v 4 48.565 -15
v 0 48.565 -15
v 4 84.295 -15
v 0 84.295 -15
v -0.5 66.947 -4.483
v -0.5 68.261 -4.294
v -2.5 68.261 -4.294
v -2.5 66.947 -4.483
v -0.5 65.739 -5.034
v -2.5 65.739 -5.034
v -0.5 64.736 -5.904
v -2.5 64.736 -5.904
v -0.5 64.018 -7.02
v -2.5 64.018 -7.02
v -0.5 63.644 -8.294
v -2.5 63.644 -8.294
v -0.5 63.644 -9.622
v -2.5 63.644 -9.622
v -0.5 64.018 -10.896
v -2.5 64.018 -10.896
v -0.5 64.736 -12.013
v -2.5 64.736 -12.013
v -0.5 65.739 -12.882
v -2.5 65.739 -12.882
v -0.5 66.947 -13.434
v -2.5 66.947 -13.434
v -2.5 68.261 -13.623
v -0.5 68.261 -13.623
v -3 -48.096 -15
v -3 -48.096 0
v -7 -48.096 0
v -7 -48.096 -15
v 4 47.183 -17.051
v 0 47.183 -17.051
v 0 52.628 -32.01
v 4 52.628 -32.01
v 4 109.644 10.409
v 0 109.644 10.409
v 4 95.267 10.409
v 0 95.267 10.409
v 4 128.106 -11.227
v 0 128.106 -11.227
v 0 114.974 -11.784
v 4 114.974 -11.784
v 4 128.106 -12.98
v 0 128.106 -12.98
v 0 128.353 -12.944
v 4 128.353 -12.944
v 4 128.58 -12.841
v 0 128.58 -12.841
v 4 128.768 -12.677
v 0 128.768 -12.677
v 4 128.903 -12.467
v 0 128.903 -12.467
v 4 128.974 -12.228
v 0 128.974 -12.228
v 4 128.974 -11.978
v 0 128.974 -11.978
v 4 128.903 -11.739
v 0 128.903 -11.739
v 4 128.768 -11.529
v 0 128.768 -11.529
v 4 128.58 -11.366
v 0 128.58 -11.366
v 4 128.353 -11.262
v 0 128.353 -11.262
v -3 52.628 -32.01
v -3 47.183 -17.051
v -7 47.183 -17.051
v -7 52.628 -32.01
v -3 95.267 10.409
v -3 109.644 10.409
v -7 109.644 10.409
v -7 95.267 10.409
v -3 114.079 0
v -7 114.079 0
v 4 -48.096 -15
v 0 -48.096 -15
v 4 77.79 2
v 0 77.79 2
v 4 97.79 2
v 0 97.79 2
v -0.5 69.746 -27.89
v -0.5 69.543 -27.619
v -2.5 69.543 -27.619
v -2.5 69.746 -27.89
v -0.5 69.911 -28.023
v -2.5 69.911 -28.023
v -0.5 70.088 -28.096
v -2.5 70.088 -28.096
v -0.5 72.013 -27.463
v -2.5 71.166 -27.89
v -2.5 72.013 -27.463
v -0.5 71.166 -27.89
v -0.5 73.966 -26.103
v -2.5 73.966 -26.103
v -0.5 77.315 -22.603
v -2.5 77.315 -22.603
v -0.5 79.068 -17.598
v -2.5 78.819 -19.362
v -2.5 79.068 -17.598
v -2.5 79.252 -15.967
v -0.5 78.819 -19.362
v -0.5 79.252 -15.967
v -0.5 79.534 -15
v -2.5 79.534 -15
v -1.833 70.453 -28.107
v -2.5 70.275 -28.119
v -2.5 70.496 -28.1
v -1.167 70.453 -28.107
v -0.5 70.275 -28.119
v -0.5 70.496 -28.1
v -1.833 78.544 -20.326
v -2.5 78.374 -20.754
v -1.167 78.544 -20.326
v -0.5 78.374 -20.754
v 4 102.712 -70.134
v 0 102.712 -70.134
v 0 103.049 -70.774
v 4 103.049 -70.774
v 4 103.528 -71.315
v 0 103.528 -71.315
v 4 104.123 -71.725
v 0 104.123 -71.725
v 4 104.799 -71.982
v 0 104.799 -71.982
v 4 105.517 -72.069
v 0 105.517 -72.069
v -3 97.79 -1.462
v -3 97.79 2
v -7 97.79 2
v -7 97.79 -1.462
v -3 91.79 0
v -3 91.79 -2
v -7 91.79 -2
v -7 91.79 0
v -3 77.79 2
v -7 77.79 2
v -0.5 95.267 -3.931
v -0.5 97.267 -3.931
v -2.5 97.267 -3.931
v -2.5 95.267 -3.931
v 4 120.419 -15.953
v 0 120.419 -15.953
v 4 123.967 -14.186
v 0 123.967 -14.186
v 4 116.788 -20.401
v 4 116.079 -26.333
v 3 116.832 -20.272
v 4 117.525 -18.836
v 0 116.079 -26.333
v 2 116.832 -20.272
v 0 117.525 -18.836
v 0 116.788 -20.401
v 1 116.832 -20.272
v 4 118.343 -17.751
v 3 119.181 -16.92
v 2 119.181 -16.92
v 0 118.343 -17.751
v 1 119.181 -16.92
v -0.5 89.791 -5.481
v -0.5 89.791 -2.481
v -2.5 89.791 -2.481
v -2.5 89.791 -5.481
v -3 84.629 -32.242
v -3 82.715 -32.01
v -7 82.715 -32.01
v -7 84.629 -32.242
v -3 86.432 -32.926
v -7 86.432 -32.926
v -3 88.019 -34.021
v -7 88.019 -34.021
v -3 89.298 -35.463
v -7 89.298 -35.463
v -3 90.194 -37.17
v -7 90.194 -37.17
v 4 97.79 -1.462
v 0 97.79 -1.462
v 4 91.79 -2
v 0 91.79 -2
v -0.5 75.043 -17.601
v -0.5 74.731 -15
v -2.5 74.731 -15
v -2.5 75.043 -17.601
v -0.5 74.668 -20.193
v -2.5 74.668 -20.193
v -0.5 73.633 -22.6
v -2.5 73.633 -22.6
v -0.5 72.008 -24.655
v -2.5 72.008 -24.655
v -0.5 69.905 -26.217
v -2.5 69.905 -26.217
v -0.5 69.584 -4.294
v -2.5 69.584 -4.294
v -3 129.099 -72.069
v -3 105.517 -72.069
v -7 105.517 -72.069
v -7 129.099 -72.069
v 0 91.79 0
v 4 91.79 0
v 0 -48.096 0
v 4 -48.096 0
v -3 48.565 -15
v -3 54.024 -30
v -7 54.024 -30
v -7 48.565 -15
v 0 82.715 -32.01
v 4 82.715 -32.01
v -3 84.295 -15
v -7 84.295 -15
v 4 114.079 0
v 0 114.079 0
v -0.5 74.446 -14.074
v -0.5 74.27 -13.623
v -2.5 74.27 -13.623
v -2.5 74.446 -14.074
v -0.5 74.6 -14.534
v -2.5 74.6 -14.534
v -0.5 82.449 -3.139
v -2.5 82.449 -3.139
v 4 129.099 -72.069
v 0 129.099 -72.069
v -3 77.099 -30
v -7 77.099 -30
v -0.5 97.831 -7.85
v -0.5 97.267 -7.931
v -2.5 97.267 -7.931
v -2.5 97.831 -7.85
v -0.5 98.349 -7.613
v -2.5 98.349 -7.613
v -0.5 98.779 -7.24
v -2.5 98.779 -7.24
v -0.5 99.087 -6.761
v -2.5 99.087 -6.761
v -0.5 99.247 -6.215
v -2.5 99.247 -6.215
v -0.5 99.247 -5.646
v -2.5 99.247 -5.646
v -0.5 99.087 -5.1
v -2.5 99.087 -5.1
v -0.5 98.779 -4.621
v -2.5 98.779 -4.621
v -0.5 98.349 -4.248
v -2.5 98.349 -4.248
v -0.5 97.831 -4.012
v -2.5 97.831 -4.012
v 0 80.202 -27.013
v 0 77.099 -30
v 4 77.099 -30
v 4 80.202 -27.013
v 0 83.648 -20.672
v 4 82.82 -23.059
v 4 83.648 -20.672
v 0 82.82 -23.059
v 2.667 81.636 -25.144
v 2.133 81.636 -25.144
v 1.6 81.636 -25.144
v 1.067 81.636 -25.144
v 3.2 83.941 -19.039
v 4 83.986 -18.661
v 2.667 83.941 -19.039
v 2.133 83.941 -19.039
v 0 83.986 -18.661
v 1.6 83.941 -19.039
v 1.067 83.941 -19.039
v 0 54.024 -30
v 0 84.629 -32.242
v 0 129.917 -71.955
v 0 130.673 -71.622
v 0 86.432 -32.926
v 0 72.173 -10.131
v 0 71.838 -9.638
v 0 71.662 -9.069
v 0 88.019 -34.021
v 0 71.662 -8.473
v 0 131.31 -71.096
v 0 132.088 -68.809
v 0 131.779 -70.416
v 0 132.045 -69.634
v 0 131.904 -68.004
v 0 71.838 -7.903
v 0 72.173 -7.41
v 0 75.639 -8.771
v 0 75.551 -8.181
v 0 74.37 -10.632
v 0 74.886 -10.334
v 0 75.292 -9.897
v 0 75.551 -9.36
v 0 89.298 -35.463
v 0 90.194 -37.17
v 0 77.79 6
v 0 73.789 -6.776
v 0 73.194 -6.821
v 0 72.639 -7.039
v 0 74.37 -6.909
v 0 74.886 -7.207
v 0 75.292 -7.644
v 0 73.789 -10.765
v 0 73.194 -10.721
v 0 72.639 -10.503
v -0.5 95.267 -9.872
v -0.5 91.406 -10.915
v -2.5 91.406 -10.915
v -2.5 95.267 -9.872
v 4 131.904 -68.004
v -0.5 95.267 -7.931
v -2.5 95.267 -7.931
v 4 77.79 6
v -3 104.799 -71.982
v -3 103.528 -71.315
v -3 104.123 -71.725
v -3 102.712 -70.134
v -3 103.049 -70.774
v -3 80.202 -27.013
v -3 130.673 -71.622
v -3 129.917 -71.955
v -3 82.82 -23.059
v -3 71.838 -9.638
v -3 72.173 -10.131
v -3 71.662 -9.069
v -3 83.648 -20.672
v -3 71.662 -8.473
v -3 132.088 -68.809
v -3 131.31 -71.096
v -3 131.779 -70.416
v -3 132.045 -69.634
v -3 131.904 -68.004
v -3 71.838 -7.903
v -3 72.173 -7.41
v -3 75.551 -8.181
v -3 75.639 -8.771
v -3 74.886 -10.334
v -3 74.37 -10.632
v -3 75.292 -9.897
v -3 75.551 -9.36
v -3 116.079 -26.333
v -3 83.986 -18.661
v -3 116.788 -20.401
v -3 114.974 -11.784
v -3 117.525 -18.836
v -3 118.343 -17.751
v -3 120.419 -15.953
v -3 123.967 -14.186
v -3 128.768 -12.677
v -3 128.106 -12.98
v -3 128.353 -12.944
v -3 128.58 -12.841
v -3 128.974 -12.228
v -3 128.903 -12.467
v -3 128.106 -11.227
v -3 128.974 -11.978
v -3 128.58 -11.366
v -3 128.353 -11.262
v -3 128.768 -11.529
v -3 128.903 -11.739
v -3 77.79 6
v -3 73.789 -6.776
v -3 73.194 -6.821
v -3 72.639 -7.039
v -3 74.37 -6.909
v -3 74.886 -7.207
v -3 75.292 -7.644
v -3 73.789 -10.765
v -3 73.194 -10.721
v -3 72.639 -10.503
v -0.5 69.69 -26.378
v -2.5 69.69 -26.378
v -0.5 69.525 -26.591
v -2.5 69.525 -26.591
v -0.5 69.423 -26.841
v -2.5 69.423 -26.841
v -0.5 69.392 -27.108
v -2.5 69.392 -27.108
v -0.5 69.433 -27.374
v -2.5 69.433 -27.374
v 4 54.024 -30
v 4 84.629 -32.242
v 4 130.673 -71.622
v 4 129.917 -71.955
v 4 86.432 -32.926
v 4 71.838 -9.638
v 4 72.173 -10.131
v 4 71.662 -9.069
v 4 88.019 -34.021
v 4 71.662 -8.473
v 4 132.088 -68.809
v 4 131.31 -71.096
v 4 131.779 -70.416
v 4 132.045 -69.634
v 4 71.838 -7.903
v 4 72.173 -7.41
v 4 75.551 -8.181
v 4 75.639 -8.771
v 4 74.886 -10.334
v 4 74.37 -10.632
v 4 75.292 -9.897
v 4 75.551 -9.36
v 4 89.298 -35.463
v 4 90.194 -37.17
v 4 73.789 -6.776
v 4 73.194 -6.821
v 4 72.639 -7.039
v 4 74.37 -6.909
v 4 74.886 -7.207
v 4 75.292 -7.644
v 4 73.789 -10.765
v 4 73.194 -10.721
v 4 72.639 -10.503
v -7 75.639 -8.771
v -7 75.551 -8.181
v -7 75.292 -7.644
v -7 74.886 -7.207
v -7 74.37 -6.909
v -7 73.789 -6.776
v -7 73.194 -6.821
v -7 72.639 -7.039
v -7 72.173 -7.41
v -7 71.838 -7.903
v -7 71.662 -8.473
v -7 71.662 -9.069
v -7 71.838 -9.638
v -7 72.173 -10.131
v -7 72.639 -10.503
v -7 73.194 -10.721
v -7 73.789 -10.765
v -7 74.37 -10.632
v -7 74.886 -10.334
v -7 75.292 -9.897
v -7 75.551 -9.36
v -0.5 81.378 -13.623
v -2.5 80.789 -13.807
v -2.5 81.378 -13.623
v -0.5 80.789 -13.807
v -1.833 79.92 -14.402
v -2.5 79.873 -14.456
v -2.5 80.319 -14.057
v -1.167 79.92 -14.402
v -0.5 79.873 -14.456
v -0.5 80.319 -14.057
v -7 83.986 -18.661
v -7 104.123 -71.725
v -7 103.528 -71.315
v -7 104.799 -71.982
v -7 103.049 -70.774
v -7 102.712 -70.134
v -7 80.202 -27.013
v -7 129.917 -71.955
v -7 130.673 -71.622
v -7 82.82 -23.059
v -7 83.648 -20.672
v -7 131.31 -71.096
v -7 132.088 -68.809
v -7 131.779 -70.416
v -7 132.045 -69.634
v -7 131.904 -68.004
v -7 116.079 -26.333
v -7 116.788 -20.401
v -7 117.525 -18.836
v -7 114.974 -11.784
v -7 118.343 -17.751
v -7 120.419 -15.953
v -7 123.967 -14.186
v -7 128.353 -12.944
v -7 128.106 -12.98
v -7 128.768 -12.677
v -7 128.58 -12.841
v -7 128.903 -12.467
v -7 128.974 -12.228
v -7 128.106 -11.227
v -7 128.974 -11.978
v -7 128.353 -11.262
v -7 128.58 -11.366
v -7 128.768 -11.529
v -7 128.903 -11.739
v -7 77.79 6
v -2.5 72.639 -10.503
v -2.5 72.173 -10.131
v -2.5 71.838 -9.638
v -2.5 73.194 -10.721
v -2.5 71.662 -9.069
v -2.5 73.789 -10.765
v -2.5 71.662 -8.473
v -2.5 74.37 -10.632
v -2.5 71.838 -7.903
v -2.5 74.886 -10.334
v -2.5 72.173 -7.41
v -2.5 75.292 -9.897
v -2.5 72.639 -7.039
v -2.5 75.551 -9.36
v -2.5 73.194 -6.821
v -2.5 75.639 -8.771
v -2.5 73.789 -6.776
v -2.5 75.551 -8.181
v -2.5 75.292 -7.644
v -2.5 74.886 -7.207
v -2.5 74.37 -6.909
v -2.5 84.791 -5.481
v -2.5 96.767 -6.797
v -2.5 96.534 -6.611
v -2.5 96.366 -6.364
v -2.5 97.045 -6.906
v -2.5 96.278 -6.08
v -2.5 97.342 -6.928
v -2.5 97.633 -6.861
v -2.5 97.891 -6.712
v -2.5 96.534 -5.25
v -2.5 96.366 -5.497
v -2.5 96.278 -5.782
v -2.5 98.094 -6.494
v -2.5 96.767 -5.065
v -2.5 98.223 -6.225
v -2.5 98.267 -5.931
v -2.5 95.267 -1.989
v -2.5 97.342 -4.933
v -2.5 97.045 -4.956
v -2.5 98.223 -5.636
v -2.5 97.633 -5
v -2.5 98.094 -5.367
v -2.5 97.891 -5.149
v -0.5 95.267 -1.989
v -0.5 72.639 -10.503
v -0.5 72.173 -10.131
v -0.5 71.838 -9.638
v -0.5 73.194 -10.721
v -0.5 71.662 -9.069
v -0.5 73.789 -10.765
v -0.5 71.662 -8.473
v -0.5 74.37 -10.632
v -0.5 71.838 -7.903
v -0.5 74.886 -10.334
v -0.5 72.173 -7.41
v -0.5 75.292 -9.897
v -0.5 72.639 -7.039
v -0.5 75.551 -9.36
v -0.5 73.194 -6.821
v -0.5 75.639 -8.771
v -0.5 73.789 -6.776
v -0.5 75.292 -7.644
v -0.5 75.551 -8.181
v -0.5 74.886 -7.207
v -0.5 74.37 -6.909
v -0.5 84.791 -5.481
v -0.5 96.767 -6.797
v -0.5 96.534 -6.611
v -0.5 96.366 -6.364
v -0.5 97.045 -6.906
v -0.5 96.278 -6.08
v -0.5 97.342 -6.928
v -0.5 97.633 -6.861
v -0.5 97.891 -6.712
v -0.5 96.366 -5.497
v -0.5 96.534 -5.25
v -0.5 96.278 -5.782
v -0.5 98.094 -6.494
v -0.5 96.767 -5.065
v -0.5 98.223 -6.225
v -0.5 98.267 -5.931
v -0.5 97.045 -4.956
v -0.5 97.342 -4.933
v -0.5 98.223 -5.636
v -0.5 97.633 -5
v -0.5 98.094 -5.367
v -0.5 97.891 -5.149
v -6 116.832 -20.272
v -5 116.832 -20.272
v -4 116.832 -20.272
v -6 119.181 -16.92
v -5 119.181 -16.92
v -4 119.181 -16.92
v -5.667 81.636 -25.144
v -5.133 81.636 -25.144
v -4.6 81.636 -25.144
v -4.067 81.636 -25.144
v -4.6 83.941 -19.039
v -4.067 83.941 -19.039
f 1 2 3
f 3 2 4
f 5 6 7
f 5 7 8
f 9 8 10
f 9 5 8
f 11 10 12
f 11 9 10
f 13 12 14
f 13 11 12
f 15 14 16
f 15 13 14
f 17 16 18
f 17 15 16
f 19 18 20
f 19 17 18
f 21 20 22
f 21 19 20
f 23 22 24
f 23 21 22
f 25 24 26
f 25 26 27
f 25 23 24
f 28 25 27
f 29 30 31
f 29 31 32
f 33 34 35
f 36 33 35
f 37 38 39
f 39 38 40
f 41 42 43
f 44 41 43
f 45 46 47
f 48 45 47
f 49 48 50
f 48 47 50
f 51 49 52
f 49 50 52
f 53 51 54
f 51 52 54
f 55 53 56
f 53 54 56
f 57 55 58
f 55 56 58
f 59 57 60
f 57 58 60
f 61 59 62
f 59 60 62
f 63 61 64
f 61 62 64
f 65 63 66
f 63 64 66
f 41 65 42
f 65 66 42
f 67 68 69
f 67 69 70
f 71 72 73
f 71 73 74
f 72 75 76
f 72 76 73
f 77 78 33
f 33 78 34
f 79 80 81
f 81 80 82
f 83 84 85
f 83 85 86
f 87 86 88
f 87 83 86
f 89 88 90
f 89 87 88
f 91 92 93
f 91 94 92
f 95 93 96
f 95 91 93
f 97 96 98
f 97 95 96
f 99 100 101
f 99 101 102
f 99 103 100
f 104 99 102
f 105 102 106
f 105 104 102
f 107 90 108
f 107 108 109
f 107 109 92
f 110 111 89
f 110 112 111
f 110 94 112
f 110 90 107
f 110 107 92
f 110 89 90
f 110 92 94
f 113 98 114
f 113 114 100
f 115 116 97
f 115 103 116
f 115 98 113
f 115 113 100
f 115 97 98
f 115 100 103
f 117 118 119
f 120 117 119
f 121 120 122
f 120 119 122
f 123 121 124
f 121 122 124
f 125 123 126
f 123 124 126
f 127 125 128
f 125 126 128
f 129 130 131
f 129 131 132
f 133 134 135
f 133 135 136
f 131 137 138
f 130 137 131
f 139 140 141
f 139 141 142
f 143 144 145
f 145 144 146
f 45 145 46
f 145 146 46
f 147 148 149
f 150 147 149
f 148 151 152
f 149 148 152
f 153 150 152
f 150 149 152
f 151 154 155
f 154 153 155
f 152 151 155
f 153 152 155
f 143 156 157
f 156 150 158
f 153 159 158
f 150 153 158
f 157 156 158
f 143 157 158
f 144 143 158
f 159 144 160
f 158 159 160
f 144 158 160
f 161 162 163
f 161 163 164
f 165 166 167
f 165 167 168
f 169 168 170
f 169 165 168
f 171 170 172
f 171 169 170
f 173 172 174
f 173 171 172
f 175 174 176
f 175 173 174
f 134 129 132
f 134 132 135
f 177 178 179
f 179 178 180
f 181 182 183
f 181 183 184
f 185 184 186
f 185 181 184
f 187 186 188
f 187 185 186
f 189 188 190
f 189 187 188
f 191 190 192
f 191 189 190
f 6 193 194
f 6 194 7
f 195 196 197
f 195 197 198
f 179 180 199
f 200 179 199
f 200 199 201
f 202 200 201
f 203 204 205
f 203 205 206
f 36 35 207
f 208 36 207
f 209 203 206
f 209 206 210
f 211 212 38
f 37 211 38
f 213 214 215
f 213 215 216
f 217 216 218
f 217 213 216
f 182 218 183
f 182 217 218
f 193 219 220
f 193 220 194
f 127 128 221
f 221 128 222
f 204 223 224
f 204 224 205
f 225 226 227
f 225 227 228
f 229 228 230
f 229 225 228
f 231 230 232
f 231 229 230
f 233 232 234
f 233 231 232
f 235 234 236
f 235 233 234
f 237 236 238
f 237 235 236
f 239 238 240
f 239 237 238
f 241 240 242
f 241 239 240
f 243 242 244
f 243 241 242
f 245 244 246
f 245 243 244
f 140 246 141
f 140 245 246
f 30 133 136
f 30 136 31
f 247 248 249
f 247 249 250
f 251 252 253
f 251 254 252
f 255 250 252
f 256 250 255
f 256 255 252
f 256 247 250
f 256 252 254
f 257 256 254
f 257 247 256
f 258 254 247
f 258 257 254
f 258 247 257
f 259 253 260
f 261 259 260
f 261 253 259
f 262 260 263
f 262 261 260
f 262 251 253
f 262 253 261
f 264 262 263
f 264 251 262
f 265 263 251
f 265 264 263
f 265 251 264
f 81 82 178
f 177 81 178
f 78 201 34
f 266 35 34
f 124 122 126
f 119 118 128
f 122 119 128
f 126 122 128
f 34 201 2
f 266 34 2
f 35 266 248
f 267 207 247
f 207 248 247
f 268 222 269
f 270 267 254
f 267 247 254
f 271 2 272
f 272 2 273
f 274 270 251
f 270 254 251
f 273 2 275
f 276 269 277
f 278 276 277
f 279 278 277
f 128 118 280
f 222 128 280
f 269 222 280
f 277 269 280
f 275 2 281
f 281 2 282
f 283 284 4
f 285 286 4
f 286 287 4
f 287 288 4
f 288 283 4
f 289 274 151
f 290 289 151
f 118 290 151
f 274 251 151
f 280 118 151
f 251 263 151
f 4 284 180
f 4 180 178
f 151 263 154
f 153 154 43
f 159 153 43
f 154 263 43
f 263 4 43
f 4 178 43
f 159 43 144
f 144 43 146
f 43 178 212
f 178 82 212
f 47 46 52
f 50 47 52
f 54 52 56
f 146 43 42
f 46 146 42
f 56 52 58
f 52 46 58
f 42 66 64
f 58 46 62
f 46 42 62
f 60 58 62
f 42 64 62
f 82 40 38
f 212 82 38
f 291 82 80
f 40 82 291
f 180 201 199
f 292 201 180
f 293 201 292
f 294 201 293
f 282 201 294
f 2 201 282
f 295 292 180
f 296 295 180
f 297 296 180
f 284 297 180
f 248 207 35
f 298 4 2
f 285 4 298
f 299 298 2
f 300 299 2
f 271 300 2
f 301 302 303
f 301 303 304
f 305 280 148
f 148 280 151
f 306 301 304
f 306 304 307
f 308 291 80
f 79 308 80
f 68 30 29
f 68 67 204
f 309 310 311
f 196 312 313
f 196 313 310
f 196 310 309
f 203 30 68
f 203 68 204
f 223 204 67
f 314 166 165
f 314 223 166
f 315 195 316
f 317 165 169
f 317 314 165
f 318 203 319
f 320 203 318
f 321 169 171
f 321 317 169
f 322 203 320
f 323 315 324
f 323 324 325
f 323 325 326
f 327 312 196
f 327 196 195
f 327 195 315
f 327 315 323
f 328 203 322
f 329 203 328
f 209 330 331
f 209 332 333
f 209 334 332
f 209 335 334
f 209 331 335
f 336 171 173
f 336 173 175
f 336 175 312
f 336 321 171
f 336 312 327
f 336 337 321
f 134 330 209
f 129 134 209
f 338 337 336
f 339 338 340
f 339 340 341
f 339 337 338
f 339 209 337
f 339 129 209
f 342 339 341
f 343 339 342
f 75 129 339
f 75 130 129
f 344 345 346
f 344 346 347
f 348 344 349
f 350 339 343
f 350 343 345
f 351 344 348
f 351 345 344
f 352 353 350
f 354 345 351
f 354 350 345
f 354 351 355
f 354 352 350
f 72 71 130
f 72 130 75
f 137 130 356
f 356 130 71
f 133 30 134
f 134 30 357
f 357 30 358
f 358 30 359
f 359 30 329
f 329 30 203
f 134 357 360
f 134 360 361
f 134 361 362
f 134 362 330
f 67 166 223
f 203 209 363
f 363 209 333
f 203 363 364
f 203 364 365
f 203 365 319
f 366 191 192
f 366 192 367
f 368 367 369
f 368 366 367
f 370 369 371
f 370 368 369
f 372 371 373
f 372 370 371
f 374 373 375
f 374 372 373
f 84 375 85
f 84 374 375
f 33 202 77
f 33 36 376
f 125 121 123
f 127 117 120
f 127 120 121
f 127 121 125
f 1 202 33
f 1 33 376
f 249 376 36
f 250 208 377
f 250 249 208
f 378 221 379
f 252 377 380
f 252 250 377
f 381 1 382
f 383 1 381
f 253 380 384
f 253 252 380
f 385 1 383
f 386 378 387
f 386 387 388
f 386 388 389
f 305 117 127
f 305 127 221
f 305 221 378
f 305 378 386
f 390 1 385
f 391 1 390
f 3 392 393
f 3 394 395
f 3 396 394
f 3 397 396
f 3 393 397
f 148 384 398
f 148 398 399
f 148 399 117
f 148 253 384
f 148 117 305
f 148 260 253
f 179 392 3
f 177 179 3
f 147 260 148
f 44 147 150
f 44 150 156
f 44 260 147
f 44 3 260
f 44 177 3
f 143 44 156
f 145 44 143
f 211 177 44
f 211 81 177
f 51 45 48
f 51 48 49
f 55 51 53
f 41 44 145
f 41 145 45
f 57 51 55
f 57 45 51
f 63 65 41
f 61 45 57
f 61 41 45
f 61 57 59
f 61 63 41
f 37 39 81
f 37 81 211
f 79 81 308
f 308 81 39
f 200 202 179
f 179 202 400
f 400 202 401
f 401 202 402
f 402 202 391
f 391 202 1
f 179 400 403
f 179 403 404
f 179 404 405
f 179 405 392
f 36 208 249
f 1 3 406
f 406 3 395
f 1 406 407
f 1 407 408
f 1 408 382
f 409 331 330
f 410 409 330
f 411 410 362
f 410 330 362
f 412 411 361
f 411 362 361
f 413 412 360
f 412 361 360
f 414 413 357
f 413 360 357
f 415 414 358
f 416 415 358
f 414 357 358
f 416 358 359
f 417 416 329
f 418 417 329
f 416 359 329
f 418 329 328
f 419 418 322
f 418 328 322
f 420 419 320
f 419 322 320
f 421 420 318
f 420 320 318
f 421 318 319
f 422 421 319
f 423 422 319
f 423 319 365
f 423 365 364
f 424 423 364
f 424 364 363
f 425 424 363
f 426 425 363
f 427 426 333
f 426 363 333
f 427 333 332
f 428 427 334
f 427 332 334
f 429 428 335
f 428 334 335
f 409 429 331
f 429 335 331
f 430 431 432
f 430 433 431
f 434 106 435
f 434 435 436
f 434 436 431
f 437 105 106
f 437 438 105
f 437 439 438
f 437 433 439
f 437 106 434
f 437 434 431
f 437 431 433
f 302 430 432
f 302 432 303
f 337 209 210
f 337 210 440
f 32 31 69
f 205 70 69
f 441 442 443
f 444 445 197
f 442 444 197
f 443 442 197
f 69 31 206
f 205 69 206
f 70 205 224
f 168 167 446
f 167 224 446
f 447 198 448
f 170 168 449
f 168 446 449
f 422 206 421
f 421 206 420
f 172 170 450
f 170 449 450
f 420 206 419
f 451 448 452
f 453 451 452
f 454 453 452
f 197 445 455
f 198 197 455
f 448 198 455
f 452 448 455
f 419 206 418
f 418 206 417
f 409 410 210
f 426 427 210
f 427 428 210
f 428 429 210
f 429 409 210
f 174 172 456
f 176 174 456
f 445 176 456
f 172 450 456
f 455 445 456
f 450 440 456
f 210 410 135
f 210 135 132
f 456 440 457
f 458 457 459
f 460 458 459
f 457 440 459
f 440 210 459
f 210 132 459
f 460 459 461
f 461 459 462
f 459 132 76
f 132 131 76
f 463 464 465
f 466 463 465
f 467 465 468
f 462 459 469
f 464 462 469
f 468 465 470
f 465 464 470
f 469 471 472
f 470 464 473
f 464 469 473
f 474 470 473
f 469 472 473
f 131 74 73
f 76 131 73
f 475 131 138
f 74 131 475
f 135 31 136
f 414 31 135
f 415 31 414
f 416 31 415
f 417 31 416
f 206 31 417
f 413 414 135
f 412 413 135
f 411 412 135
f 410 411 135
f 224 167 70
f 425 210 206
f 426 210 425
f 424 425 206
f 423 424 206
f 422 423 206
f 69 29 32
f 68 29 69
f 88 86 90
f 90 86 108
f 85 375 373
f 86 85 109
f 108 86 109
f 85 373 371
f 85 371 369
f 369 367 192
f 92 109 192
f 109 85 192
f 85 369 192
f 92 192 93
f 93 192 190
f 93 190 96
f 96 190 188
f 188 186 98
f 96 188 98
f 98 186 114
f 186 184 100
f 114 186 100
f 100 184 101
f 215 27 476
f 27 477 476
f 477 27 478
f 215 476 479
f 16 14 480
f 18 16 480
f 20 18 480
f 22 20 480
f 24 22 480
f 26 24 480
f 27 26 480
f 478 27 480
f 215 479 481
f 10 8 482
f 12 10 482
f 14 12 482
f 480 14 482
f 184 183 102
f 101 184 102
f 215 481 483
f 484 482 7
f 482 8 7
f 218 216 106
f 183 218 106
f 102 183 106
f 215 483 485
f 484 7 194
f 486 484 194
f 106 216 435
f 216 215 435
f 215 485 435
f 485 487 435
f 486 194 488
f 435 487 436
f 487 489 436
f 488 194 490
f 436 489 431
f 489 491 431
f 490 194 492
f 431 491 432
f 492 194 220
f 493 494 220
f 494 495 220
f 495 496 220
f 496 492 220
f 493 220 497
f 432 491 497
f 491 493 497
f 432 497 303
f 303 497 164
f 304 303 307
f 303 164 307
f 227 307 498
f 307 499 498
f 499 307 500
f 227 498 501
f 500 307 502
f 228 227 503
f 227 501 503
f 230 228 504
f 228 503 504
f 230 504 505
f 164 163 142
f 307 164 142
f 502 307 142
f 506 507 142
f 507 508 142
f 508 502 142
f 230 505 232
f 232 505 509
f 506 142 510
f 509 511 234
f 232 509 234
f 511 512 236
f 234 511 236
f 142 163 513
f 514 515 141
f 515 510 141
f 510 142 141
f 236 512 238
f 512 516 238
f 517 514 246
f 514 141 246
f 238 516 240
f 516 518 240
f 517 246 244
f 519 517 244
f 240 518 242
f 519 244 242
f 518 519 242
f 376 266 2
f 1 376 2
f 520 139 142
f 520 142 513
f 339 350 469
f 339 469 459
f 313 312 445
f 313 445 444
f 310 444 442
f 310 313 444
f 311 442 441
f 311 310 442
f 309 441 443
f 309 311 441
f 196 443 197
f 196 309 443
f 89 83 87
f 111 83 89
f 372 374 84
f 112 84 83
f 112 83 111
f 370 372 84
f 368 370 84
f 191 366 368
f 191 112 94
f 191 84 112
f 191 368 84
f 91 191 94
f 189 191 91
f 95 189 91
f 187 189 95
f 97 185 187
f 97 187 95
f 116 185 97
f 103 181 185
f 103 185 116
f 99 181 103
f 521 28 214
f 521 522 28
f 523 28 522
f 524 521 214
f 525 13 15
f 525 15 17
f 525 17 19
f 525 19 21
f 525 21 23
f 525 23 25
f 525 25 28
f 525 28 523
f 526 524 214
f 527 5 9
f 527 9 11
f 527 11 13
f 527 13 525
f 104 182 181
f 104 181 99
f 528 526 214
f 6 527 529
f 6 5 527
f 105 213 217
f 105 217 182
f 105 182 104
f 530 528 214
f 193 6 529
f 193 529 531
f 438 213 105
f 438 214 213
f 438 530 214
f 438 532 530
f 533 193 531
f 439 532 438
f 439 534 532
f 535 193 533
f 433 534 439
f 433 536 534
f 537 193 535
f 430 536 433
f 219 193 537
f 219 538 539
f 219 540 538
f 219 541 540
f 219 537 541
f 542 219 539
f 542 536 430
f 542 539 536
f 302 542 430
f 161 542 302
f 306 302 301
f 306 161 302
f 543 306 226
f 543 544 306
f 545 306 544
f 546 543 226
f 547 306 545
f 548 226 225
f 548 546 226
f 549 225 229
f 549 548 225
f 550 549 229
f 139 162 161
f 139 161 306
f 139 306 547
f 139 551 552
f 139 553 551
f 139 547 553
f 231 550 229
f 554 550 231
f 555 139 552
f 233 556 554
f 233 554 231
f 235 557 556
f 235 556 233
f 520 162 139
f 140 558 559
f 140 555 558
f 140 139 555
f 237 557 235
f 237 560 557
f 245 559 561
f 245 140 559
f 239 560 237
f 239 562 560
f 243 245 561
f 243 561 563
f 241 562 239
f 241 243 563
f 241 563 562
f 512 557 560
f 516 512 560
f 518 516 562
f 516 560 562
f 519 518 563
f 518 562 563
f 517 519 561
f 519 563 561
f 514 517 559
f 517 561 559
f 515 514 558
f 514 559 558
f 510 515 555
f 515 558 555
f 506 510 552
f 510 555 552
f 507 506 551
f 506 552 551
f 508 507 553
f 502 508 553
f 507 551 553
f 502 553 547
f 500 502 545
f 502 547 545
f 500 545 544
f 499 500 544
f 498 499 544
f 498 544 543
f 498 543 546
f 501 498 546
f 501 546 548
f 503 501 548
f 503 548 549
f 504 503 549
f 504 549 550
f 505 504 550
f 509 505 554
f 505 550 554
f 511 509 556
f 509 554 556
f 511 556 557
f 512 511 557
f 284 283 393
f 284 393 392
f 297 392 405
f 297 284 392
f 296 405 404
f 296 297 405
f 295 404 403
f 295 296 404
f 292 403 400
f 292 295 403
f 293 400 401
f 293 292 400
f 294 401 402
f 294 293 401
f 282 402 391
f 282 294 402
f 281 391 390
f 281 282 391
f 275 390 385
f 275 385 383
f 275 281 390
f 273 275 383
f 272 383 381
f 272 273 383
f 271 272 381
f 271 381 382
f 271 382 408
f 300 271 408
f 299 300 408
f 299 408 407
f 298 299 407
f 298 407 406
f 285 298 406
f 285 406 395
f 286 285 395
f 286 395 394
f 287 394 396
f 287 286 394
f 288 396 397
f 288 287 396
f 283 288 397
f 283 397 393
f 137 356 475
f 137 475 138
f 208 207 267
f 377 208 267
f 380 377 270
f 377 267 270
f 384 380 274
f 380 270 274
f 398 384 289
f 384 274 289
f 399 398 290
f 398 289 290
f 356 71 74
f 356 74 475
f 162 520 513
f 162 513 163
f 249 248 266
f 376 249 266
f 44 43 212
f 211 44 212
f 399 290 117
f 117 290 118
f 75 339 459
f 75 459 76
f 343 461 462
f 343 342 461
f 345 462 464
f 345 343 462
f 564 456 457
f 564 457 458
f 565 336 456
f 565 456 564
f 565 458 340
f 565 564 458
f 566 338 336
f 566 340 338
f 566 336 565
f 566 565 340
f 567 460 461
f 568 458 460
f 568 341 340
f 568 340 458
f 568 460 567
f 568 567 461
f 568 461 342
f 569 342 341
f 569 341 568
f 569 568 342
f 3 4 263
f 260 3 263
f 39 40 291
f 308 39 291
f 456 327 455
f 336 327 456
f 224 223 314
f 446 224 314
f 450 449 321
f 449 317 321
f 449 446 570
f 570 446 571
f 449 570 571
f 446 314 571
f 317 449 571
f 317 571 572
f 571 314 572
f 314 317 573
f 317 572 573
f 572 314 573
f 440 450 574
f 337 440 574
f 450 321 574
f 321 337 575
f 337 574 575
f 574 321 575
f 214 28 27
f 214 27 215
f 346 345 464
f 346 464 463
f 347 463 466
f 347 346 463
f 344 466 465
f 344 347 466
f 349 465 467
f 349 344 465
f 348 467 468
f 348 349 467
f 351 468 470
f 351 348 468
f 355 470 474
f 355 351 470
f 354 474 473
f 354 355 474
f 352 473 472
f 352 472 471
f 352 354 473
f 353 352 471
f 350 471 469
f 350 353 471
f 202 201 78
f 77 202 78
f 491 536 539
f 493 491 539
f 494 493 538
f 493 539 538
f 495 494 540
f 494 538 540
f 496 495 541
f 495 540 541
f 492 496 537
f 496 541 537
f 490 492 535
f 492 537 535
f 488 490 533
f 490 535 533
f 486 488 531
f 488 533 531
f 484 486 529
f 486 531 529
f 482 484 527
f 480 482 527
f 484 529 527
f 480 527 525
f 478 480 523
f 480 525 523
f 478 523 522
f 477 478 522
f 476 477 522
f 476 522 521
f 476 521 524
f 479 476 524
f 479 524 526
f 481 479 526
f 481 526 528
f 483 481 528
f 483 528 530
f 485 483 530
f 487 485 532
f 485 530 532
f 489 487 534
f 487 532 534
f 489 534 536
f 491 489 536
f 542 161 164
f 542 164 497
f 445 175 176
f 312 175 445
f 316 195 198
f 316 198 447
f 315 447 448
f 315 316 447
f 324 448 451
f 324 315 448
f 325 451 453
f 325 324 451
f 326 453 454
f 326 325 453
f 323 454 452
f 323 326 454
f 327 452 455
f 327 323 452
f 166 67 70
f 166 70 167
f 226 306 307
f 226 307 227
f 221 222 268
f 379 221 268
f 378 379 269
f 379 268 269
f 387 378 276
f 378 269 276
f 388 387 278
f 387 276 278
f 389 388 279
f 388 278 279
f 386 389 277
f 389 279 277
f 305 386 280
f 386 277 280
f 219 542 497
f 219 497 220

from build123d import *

# Parameters (mm, degrees)
F1_START = -0.5
F0_R     = 2
F0_R_2   = 1
F1_DEPTH = 2
F2_DEPTH = 4


# Not quite as in the source:
# - ends of sketch curves that miss each other by under 0.0002 mm in the source are joined
# - the dataset's text gives a spline's control points without its knots; the knots are read off the source's solid
# - a feature names something its author has since deleted; it is built from what else it names


with BuildPart() as f1:
    # F0 (on Right) → F1 (new body)
    with BuildSketch(Plane.YZ.offset(F1_START)):
        with BuildLine():
            ThreePointArc((74.2699354887, -13.6226043105), (74.5256304067, -14.3029139587), (74.7312395212, -14.9999978852))
            Line((74.7312395212, -14.9999978852), (79.5344771551, -14.9999978852))
            add(Edge.make_bspline(
                [(79.5344771551, -14.9999978852), (79.833759811, -14.3420916762), (80.3656146055, -13.855022927), (81.3782960176, -13.6226043105)],
                knots=[0.8797014903, 0.8797014903, 0.8797014903, 0.8797014903, 1, 1, 1, 1], degree=3))
            Line((81.3782960176, -13.6226043105), (91.4055867413, -10.9148137206))
            Line((91.4055867413, -10.9148137206), (95.2672621608, -9.8719988018))
            Line((95.2672621608, -9.8719988018), (95.2672621608, -7.9305966889))
            Line((95.2672621608, -7.9305966889), (95.2672621608, -3.9305966889))
            Line((95.2672621608, -3.9305966889), (95.2672621608, -1.989194576))
            Line((95.2672621608, -1.989194576), (89.7907053864, -2.4806121155))
            Line((89.7907053864, -2.4806121155), (89.7907053864, -5.4806121155))
            Line((89.7907053864, -5.4806121155), (84.7907053864, -5.4806121155))
            Line((84.7907053864, -5.4806121155), (82.4494448697, -3.1393515989))
            Line((82.4494448697, -3.1393515989), (69.5844688412, -4.2937402278))
            Line((69.5844688412, -4.2937402278), (68.2608369428, -4.2937402278))
            ThreePointArc((68.2608369428, -4.2937402278), (63.5964049015, -8.9581722692), (68.2608369428, -13.6226043105))
            Line((68.2608369428, -13.6226043105), (74.2699354887, -13.6226043105))
        make_face()
        with Locations((73.6394673586, -8.7706744671)):
            Circle(F0_R, mode=Mode.SUBTRACT)
        with BuildLine():
            ThreePointArc((74.7312395212, -14.9999978852), (74.229250114, -21.4306402993), (69.9054296146, -26.2170514299))
            ThreePointArc((69.9054296146, -26.2170514299), (69.4234887038, -26.8405376944), (69.5427737838, -27.6194941971))
            add(Edge.make_bspline(
                [(69.5427737838, -27.6194941971), (69.7756231299, -27.9934208955), (70.8908571939, -28.846881775), (79.88515612, -22.0379378106), (78.9360042075, -16.3156072614), (79.5344771551, -14.9999978852)],
                knots=[0.0751310014, 0.0751310014, 0.0751310014, 0.0751310014, 0.1909888597, 0.6391415971, 0.8797014903, 0.8797014903, 0.8797014903, 0.8797014903], degree=3))
            Line((79.5344771551, -14.9999978852), (74.7312395212, -14.9999978852))
        make_face()
        with BuildLine():
            Line((95.2672621608, -3.9305966889), (95.2672621608, -7.9305966889))
            Line((95.2672621608, -7.9305966889), (97.2672621608, -7.9305966889))
            ThreePointArc((97.2672621608, -7.9305966889), (99.2672621608, -5.9305966889), (97.2672621608, -3.9305966889))
            Line((97.2672621608, -3.9305966889), (95.2672621608, -3.9305966889))
        make_face()
        with Locations((97.2672621608, -5.9305966889)):
            Circle(F0_R_2, mode=Mode.SUBTRACT)
    extrude(amount=-F1_DEPTH)


with BuildPart() as f2:
    # F0 (on Right) → F2 (new body)
    with BuildSketch(Plane.YZ):
        with BuildLine():
            ThreePointArc((82.7154165104, -32.0100596195), (87.2584865329, -33.4251894787), (90.194298045, -37.1699309267))
            Line((90.194298045, -37.1699309267), (102.7124142253, -70.1337568918))
            ThreePointArc((102.7124142253, -70.1337568918), (103.8133435424, -71.5380349348), (105.5169948008, -72.068708632))
            Line((105.5169948008, -72.068708632), (129.0989228233, -72.068708632))
            ThreePointArc((129.0989228233, -72.068708632), (131.5682491261, -70.7723598904), (131.9035033988, -68.0036603722))
            Line((131.9035033988, -68.0036603722), (116.0789003285, -26.3328966518))
            add(Edge.make_bspline(
                [(116.0789003285, -26.3328966518), (116.1564016078, -24.1501429386), (116.2971797879, -20.1785641936), (119.0310238282, -16.7283649073), (122.8788302042, -14.3416877179), (126.3069431811, -13.450153948), (128.1059980392, -12.9797337577)],
                knots=[0, 0, 0, 0, 0.2769497136, 0.5036740855, 0.738714159, 1, 1, 1, 1], degree=3))
            ThreePointArc((128.1059980392, -12.9797337577), (128.982509952, -12.1032218449), (128.1059980392, -11.2267099321))
            Line((128.1059980392, -11.2267099321), (114.9739147732, -11.7841614367))
            Line((114.9739147732, -11.7841614367), (114.0789003285, 0))
            Line((114.0789003285, 0), (109.6443608403, 10.4085551575))
            Line((109.6443608403, 10.4085551575), (95.2672621608, 10.4085551575))
            Line((95.2672621608, 10.4085551575), (77.7900875211, 6))
            Line((77.7900875211, 6), (77.7900875211, 2))
            Line((77.7900875211, 2), (97.7900875211, 2))
            Line((97.7900875211, 2), (97.7900875211, 0))
            Line((97.7900875211, 0), (97.7900875211, -1.4616133168))
            Line((97.7900875211, -1.4616133168), (91.7900875211, -2))
            Line((91.7900875211, -2), (91.7900875211, 0))
            Line((91.7900875211, 0), (-48.0964966012, 0))
            Line((-48.0964966012, 0), (-48.0964966012, -15))
            Line((-48.0964966012, -15), (47.1827716724, -17.0506781676))
            Line((47.1827716724, -17.0506781676), (52.6275412439, -32.0100596195))
            Line((52.6275412439, -32.0100596195), (82.7154165104, -32.0100596195))
        make_face()
        with BuildLine():
            Line((48.5647406346, -14.9999978852), (74.7312395212, -14.9999978852))
            ThreePointArc((74.7312395212, -14.9999978852), (74.5256304067, -14.3029139587), (74.2699354887, -13.6226043105))
            Line((74.2699354887, -13.6226043105), (68.2608369428, -13.6226043105))
            ThreePointArc((68.2608369428, -13.6226043105), (63.5964049015, -8.9581722692), (68.2608369428, -4.2937402278))
            Line((68.2608369428, -4.2937402278), (69.5844688412, -4.2937402278))
            Line((69.5844688412, -4.2937402278), (82.4494448697, -3.1393515989))
            Line((82.4494448697, -3.1393515989), (84.7907053864, -5.4806121155))
            Line((84.7907053864, -5.4806121155), (89.7907053864, -5.4806121155))
            Line((89.7907053864, -5.4806121155), (89.7907053864, -2.4806121155))
            Line((89.7907053864, -2.4806121155), (95.2672621608, -1.989194576))
            Line((95.2672621608, -1.989194576), (95.2672621608, -3.9305966889))
            Line((95.2672621608, -3.9305966889), (97.2672621608, -3.9305966889))
            ThreePointArc((97.2672621608, -3.9305966889), (99.2672621608, -5.9305966889), (97.2672621608, -7.9305966889))
            Line((97.2672621608, -7.9305966889), (95.2672621608, -7.9305966889))
            Line((95.2672621608, -7.9305966889), (95.2672621608, -9.8719988018))
            Line((95.2672621608, -9.8719988018), (95.7886696202, -11.8028365115))
            Line((95.7886696202, -11.8028365115), (91.9269942007, -12.8456514304))
            Line((91.9269942007, -12.8456514304), (91.4055867413, -10.9148137206))
            Line((91.4055867413, -10.9148137206), (81.3782960176, -13.6226043105))
            add(Edge.make_bspline(
                [(79.5344771551, -14.9999978852), (79.833759811, -14.3420916762), (80.3656146055, -13.855022927), (81.3782960176, -13.6226043105)],
                knots=[0.8797014903, 0.8797014903, 0.8797014903, 0.8797014903, 1, 1, 1, 1], degree=3))
            Line((79.5344771551, -14.9999978852), (84.2950418591, -14.9999978852))
            Line((84.2950418591, -14.9999978852), (83.986338858, -18.6614259073))
            add(Edge.make_bspline(
                [(77.0986897784, -30.0000272336), (77.4741298849, -29.6976374668), (78.3368077115, -28.960094006), (79.6638223749, -27.6571775431), (80.7998106474, -26.3257545652), (81.6427583036, -25.1541637131), (82.2327671194, -24.2151704071), (82.6797224931, -23.3743926577), (83.002030475, -22.6607865386), (83.1867359511, -22.1955964224), (83.3220738815, -21.8126055157), (83.4441699526, -21.4374057344), (83.5752904919, -20.9792524975), (83.7019603463, -20.4522364549), (83.8361720396, -19.7834574031), (83.9254022758, -19.1835780723), (83.97287916, -18.7827266699), (83.986338858, -18.6614259073)],
                knots=[0.3840308553, 0.3840308553, 0.3840308553, 0.3840308553, 0.4248462567, 0.4779520388, 0.5310578209, 0.5576107119, 0.584163603, 0.610716494, 0.6239929395, 0.6372693851, 0.6439076078, 0.6505458306, 0.6638222761, 0.6770987216, 0.6903751672, 0.7169280582, 0.7291158391, 0.7291158391, 0.7291158391, 0.7291158391], degree=3))
            Line((77.0986897784, -30.0000272336), (54.0242941486, -29.9999978852))
            Line((54.0242941486, -29.9999978852), (48.5647406346, -14.9999978852))
        make_face(mode=Mode.SUBTRACT)
        with BuildLine():
            ThreePointArc((74.2699354887, -13.6226043105), (74.5256304067, -14.3029139587), (74.7312395212, -14.9999978852))
            Line((74.7312395212, -14.9999978852), (79.5344771551, -14.9999978852))
            add(Edge.make_bspline(
                [(79.5344771551, -14.9999978852), (79.833759811, -14.3420916762), (80.3656146055, -13.855022927), (81.3782960176, -13.6226043105)],
                knots=[0.8797014903, 0.8797014903, 0.8797014903, 0.8797014903, 1, 1, 1, 1], degree=3))
            Line((81.3782960176, -13.6226043105), (91.4055867413, -10.9148137206))
            Line((91.4055867413, -10.9148137206), (95.2672621608, -9.8719988018))
            Line((95.2672621608, -9.8719988018), (95.2672621608, -7.9305966889))
            Line((95.2672621608, -7.9305966889), (95.2672621608, -3.9305966889))
            Line((95.2672621608, -3.9305966889), (95.2672621608, -1.989194576))
            Line((95.2672621608, -1.989194576), (89.7907053864, -2.4806121155))
            Line((89.7907053864, -2.4806121155), (89.7907053864, -5.4806121155))
            Line((89.7907053864, -5.4806121155), (84.7907053864, -5.4806121155))
            Line((84.7907053864, -5.4806121155), (82.4494448697, -3.1393515989))
            Line((82.4494448697, -3.1393515989), (69.5844688412, -4.2937402278))
            Line((69.5844688412, -4.2937402278), (68.2608369428, -4.2937402278))
            ThreePointArc((68.2608369428, -4.2937402278), (63.5964049015, -8.9581722692), (68.2608369428, -13.6226043105))
            Line((68.2608369428, -13.6226043105), (74.2699354887, -13.6226043105))
        make_face()
        with Locations((73.6394673586, -8.7706744671)):
            Circle(F0_R, mode=Mode.SUBTRACT)
        with BuildLine():
            Line((95.2672621608, -3.9305966889), (95.2672621608, -7.9305966889))
            Line((95.2672621608, -7.9305966889), (97.2672621608, -7.9305966889))
            ThreePointArc((97.2672621608, -7.9305966889), (99.2672621608, -5.9305966889), (97.2672621608, -3.9305966889))
            Line((97.2672621608, -3.9305966889), (95.2672621608, -3.9305966889))
        make_face()
        with Locations((97.2672621608, -5.9305966889)):
            Circle(F0_R_2, mode=Mode.SUBTRACT)
        Polygon((95.2672621608, -9.8719988018), (91.4055867413, -10.9148137206), (91.9269942007, -12.8456514304), (95.7886696202, -11.8028365115), align=None)
        with Locations((97.2672621608, -5.9305966889)):
            Circle(F0_R_2)
    extrude(amount=F2_DEPTH)


with BuildPart() as f4_1:
    # F4: instance of F2
    add(f2.part.mirror(Plane.YZ.offset(-1.5)))


solid = Compound([f1.part, f2.part, f4_1.part])
